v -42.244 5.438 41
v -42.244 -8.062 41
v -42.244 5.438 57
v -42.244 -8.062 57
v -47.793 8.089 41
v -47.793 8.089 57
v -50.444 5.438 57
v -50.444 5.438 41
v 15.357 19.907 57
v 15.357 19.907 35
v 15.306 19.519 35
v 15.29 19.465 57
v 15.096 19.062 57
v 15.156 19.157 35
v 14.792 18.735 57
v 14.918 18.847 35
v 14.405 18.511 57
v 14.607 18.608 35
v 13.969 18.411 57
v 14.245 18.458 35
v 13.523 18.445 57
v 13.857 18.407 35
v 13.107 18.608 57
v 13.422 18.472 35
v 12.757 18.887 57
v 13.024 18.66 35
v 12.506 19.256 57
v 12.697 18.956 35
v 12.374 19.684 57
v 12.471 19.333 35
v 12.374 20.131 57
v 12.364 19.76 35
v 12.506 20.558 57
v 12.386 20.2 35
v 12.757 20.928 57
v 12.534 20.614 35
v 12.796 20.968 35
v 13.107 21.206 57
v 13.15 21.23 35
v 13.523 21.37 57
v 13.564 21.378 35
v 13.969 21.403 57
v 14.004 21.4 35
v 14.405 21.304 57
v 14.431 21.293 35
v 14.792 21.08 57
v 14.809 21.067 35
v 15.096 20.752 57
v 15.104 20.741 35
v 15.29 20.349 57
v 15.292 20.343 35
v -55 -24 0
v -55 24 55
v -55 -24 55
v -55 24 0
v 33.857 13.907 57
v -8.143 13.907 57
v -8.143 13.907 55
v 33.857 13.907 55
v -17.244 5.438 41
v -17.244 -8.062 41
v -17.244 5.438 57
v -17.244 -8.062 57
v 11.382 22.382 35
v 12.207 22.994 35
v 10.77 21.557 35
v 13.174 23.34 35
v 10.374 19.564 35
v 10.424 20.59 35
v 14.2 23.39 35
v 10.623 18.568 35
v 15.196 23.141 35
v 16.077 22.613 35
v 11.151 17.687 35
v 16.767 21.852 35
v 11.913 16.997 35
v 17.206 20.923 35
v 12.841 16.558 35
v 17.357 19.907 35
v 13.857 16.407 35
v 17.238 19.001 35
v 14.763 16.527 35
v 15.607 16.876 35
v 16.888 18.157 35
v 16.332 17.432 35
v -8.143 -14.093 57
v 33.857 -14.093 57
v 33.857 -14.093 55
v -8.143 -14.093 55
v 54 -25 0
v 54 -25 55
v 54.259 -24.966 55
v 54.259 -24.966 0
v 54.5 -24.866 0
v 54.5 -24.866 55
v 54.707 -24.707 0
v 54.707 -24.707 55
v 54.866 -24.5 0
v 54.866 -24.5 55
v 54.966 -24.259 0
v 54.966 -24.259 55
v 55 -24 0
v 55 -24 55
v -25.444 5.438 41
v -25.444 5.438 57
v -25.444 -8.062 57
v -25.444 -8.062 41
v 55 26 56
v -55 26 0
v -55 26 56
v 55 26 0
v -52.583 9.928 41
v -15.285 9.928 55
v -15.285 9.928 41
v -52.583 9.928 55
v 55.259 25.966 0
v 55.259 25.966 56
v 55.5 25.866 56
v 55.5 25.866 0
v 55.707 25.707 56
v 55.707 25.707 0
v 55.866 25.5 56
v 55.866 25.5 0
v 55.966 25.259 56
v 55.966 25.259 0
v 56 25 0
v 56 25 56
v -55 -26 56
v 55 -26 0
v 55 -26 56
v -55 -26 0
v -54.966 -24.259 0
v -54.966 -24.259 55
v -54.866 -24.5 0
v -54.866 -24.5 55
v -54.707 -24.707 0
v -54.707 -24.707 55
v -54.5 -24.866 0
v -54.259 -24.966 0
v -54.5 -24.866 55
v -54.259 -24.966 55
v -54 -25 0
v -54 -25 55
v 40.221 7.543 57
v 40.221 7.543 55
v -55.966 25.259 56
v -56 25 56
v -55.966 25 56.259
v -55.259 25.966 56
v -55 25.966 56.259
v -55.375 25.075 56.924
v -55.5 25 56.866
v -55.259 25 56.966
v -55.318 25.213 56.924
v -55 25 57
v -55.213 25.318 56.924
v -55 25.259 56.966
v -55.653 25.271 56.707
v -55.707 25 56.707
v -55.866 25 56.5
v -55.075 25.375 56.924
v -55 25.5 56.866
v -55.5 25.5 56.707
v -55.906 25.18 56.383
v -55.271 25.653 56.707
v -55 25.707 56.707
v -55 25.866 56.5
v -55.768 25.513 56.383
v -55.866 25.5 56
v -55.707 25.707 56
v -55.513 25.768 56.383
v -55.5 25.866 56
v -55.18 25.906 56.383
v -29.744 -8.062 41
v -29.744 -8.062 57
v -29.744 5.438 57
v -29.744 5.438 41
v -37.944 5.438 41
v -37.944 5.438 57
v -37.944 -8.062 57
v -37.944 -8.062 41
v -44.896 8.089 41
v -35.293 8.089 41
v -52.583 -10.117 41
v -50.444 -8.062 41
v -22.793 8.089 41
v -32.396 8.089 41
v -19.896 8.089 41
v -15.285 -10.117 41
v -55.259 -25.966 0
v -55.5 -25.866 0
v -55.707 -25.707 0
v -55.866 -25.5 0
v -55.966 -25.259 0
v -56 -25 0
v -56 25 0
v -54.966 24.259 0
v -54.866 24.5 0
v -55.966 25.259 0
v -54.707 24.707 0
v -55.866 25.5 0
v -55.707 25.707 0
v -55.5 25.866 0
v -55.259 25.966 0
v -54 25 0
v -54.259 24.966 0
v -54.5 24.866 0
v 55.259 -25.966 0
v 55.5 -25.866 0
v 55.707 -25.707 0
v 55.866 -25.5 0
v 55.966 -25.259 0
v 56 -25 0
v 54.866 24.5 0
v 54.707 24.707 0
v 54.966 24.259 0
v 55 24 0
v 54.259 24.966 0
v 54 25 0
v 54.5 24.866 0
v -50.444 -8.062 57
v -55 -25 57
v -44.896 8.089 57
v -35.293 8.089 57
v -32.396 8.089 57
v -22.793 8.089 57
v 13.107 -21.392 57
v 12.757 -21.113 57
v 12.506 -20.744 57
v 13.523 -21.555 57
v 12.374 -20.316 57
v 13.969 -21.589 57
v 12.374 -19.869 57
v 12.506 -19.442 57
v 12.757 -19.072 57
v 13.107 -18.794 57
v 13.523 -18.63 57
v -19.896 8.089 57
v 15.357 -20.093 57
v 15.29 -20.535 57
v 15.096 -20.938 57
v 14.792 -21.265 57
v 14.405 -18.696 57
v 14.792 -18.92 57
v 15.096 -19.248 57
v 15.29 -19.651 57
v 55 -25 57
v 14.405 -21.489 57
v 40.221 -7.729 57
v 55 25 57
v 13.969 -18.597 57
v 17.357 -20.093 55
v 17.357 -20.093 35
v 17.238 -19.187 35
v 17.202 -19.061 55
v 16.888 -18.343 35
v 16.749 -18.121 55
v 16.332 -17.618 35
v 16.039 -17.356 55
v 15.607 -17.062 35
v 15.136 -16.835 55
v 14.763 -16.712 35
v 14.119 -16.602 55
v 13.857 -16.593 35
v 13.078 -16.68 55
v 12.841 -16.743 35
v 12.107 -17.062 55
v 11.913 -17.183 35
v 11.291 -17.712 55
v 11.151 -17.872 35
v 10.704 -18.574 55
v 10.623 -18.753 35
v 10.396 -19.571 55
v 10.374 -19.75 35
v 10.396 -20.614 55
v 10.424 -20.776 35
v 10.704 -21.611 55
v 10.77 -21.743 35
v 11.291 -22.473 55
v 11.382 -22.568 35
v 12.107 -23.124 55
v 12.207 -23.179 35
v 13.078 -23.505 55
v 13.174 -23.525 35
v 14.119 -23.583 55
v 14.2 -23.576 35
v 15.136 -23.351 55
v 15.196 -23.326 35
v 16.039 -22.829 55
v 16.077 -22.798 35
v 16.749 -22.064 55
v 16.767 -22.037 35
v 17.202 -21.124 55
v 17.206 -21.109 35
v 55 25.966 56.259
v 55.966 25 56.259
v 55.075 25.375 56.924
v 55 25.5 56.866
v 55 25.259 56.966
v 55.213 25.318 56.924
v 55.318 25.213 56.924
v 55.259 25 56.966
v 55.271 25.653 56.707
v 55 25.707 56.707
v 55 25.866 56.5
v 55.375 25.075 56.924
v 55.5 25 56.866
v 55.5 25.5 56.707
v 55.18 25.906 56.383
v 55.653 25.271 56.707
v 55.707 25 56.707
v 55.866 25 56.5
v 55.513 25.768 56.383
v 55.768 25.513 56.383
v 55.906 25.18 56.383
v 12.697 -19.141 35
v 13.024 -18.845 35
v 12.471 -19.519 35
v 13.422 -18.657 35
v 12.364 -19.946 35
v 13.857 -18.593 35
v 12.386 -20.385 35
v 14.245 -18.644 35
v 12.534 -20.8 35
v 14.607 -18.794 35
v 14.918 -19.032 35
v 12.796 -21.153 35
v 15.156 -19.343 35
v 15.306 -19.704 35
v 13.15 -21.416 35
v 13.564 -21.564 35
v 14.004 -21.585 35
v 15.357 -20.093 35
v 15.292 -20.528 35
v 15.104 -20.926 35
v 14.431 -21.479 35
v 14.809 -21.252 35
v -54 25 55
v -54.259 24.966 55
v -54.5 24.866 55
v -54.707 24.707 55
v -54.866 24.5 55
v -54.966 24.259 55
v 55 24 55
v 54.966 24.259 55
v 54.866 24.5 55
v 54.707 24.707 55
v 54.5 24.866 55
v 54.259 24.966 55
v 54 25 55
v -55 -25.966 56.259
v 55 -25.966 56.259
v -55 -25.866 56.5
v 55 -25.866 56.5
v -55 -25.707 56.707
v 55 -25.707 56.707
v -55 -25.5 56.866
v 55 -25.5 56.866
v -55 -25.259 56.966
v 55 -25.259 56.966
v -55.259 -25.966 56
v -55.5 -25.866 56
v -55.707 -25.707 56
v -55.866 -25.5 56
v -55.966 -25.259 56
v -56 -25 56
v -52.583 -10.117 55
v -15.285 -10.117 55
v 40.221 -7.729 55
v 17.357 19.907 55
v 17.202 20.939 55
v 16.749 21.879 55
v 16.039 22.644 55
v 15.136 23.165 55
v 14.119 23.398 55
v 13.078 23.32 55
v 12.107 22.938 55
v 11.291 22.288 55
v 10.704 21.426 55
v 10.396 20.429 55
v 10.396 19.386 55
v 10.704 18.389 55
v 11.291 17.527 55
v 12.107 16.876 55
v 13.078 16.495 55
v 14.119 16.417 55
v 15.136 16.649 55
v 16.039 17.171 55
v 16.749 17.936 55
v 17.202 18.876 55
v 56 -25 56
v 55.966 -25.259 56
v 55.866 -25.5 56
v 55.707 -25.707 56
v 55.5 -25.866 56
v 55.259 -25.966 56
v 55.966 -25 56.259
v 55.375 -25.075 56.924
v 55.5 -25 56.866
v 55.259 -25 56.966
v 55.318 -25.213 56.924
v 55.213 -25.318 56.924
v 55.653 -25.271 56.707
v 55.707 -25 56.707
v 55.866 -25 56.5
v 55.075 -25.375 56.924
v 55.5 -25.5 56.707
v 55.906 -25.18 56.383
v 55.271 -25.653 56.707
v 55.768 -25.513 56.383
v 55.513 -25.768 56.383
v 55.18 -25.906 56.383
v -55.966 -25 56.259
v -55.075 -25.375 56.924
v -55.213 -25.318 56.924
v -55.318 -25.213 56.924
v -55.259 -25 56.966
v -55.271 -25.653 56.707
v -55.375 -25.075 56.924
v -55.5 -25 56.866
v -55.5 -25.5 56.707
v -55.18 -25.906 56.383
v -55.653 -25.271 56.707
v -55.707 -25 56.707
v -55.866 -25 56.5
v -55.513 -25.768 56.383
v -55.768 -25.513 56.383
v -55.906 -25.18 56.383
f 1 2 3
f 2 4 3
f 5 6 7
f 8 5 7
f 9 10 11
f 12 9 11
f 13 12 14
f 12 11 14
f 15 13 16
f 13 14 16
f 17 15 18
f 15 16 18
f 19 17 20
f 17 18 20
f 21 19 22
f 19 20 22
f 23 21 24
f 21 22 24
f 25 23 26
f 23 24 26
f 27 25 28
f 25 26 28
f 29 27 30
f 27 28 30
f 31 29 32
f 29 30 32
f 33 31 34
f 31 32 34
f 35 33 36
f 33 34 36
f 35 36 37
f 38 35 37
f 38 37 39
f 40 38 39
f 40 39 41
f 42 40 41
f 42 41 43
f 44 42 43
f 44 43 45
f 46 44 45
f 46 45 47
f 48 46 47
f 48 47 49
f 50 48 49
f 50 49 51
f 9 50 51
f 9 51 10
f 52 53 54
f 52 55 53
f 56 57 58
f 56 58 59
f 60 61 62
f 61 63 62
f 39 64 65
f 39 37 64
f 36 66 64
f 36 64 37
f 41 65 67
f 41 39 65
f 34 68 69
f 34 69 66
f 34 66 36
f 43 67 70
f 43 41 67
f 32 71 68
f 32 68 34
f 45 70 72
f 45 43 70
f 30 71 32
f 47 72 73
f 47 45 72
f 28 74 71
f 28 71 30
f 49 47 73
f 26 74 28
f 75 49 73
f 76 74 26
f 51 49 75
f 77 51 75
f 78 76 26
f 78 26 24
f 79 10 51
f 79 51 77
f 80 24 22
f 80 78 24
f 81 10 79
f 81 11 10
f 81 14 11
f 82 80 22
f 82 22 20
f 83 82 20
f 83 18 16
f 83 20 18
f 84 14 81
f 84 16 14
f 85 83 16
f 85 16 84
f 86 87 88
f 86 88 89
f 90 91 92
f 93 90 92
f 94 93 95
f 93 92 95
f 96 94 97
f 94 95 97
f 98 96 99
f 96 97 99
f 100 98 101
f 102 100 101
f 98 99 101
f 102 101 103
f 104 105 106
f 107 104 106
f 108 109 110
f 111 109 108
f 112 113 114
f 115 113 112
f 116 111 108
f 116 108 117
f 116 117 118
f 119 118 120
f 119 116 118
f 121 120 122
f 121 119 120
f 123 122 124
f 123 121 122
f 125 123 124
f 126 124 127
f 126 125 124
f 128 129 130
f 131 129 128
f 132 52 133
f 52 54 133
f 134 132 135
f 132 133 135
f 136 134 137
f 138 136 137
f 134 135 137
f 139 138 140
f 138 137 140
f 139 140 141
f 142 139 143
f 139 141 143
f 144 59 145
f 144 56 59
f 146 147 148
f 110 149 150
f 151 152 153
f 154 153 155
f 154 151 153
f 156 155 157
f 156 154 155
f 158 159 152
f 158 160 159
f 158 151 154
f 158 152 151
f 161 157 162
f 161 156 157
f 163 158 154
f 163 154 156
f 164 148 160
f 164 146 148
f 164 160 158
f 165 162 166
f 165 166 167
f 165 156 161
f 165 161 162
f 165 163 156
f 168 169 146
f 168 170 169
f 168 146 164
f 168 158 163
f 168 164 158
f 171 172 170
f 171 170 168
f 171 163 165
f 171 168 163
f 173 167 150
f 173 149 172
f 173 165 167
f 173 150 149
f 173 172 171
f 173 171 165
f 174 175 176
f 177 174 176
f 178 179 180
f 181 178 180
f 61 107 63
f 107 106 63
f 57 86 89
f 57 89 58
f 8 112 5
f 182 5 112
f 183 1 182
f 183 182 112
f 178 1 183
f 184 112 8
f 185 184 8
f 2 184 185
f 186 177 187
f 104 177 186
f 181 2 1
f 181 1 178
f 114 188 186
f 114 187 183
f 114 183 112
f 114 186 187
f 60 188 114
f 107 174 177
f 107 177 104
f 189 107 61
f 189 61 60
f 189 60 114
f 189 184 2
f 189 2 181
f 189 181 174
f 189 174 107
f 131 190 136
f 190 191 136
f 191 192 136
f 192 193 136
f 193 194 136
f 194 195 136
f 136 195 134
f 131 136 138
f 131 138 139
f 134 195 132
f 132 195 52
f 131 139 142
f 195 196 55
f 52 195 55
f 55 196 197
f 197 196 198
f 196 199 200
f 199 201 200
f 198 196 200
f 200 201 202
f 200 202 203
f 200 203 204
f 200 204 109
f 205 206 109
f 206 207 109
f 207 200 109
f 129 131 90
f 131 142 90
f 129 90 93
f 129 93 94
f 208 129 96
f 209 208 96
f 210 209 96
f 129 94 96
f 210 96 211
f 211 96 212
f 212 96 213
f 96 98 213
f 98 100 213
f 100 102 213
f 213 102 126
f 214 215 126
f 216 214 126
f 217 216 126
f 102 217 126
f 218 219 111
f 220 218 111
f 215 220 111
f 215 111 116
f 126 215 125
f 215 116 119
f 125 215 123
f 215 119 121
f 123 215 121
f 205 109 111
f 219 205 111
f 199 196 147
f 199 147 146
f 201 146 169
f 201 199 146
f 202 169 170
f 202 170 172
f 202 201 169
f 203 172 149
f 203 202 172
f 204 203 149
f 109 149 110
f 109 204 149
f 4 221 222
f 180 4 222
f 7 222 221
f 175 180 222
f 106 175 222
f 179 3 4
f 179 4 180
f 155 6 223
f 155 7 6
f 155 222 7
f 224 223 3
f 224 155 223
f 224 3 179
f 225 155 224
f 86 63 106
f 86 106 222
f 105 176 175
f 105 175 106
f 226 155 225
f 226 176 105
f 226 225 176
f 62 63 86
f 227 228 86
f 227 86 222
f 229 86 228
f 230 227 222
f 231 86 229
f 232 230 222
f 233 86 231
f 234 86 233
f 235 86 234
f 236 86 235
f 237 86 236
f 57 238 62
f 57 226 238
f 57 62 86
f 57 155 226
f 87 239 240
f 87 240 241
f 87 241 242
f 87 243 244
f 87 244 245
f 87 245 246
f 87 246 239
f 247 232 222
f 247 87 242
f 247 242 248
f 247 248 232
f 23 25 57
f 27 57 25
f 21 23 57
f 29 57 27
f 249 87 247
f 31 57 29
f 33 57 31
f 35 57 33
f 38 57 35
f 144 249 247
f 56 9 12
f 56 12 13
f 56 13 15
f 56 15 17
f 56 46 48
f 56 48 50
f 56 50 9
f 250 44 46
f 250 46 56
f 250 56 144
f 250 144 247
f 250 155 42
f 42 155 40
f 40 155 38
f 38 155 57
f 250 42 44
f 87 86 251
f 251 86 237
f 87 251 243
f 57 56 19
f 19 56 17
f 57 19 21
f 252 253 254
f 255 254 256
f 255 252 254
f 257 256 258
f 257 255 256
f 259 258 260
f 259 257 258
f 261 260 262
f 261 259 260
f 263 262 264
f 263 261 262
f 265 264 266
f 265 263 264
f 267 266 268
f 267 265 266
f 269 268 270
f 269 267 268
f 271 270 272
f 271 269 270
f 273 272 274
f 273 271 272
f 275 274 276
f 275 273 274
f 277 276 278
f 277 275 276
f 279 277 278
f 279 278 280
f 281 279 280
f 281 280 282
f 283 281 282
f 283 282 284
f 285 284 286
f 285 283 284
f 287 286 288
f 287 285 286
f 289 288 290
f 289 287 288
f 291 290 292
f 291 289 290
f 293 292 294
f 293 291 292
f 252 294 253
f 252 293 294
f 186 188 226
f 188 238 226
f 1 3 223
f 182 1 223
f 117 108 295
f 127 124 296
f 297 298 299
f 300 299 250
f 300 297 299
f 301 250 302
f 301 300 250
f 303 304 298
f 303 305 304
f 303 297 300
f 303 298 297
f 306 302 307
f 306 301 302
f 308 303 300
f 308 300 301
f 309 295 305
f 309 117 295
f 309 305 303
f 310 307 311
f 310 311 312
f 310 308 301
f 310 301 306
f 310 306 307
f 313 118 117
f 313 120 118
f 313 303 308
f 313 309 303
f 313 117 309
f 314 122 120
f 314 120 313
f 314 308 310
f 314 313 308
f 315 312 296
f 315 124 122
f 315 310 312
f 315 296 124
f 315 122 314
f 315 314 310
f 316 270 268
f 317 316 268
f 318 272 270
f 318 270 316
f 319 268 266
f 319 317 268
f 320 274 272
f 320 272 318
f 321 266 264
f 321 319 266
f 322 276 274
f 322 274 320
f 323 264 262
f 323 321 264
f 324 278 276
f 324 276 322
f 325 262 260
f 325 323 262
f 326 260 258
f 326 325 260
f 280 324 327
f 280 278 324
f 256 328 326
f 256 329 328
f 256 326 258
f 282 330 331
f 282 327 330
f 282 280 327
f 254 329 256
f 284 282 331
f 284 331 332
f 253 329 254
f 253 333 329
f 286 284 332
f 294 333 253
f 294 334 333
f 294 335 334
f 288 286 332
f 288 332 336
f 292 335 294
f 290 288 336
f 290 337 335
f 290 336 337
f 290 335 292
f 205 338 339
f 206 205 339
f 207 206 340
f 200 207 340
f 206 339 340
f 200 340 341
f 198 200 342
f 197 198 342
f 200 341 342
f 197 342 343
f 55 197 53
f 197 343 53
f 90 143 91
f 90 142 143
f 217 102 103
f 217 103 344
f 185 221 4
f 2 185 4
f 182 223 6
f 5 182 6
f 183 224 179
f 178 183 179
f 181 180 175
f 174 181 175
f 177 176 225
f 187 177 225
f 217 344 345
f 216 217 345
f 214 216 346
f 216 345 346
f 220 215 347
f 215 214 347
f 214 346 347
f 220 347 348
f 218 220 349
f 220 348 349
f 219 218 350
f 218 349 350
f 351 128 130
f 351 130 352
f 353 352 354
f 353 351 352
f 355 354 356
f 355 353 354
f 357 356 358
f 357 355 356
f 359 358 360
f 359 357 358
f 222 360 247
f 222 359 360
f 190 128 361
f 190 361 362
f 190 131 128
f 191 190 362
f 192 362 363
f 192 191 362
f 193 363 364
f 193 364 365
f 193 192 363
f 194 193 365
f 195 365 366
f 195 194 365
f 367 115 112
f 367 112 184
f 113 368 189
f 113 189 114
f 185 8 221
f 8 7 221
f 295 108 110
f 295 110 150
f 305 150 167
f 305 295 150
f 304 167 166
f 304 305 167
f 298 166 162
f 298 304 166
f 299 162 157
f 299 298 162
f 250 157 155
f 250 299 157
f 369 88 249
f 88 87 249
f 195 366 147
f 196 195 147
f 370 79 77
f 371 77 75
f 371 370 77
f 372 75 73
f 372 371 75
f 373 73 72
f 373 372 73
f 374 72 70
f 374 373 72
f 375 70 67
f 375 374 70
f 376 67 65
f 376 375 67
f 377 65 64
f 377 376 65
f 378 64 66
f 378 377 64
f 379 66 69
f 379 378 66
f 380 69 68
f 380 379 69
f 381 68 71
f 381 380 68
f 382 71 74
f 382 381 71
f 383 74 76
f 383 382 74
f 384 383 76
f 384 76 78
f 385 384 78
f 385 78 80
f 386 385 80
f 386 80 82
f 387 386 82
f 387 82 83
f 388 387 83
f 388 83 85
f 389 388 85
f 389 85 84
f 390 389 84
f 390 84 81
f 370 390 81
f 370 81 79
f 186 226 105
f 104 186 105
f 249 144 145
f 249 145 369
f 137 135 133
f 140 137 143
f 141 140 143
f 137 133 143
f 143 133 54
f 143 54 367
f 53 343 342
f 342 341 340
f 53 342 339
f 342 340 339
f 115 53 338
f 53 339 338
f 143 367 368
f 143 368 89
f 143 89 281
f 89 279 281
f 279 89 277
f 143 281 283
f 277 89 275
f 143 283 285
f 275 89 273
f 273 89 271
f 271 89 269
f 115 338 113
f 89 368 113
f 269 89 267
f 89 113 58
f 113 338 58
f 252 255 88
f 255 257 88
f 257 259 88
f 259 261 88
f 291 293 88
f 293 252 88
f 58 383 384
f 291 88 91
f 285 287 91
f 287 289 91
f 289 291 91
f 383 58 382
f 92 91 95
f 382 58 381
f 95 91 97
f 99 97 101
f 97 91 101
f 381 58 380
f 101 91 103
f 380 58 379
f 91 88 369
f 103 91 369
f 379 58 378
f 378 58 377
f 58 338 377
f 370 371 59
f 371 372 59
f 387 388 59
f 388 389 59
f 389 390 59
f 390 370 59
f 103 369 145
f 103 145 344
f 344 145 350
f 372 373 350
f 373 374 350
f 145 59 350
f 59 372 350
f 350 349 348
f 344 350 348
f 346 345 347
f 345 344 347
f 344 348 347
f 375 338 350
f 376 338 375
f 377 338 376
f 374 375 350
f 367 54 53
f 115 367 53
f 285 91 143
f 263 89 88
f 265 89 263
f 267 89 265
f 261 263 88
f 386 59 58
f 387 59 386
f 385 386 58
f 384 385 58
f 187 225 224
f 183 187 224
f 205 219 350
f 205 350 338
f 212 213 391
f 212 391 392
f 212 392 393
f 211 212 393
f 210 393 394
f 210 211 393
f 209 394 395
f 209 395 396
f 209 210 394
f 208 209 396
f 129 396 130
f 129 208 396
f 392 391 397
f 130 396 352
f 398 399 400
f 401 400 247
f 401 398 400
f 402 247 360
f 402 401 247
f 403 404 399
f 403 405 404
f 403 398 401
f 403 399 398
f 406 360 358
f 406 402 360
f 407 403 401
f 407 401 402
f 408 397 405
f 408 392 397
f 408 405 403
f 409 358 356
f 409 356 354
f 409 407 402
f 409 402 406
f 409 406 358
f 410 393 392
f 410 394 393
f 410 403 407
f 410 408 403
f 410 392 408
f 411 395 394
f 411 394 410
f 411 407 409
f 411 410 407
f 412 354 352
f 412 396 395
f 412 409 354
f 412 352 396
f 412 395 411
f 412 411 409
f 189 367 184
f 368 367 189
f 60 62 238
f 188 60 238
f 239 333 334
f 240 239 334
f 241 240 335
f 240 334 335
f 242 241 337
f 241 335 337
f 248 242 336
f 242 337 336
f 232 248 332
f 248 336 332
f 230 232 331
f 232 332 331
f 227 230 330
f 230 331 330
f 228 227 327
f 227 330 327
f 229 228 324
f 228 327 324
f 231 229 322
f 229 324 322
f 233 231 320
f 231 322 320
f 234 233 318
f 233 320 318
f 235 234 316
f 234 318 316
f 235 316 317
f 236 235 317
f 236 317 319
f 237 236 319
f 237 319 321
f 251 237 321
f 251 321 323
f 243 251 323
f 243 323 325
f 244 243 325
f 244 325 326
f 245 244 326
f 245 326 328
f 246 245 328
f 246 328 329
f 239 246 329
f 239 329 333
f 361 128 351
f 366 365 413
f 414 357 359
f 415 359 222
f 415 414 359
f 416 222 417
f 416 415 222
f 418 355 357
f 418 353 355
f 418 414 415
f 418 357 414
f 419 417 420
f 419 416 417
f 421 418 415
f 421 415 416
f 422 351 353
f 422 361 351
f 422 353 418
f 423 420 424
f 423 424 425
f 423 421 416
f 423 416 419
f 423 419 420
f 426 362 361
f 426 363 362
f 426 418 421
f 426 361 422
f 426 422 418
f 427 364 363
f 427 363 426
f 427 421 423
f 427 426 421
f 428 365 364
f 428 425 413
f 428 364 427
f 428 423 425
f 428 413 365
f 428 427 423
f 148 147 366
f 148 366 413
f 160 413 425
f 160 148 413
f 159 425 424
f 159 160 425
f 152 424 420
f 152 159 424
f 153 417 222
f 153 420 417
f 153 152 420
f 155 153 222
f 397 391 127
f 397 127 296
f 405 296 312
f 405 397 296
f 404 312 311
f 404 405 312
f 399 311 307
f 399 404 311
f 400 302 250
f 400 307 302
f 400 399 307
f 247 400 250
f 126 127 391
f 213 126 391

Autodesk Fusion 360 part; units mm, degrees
sketch "Box" plane through (0, 0, 0) normal (0, 0, 1) x (1, 0, 0)
  line L0 (55, 25) -> (-55, 25)
  line L1 (-55, 25) -> (-55, -25)
  line L2 (-55, -25) -> (55, -25)
  line L3 (55, -25) -> (55, 25)
  line L4 (55, 25) -> (-55, -25) construction
  line L5 (-55, 25) -> (55, -25) construction
  line L6 (56, -26) -> (-56, -26)
  line L7 (-56, -26) -> (-56, 26)
  line L8 (-56, 26) -> (56, 26)
  line L9 (56, 26) -> (56, -26)
  line L10 (56, -26) -> (-56, 26) construction
  line L11 (-56, -26) -> (56, 26) construction
  dimension "d2" = 110
  dimension "d3" = 50
  dimension "d4" = 112
  dimension "d5" = 52
extrude "Extrude1" add sketch "Box" along normal blind 55
fillet "Fillet1" radius 1 4 edges at (56, -26, 27.5) (-56, -26, 27.5) (56, 26, 27.5) (-56, 26, 27.5)
fillet "Fillet2" radius 1 4 edges at (55, -25, 27.5) (55, 25, 27.5) (-55, 25, 27.5) (-55, -25, 27.5)
ref_plane "WorkPlane1" through (0, 0, 55) normal (0, 0, 1) x (1, 0, 0)
sketch "Lid" plane through (0, 0, 55) normal (0, 0, 1) x (1, 0, 0)
  line L0 (55, -26) -> (-55, -26)
  line L1 (-56, -25) -> (-56, 25)
  line L2 (-55, 26) -> (55, 26)
  line L3 (56, 25) -> (56, -25)
  line L4 (56, -26) -> (-56, 26) construction
  line L5 (-56, -26) -> (56, 26) construction
  arc A0 (-55, 26) -> (-56, 25) centre (-55, 25) ccw
  arc A1 (56, 25) -> (55, 26) centre (55, 25) ccw
  arc A2 (55, -26) -> (56, -25) centre (55, -25) ccw
  arc A3 (-56, -25) -> (-55, -26) centre (-55, -25) ccw
  dimension "d13" = 112
  dimension "d14" = 52
  dimension "d15" = 1
  dimension "d16" = 1
  dimension "d17" = 1
  dimension "d18" = 1
extrude "Extrude2" add sketch "Lid" along normal blind 2
fillet "Fillet3" radius 1 8 edges at (0, 26, 57) (-55.7071, 25.7071, 57) (-56, 0, 57) (-55.7071, -25.7071, 57) (0, -26, 57) (55.7071, -25.7071, 57) (56, 0, 57) (55.7071, 25.7071, 57)
sketch "230 plug" plane through (0, 0, 57) normal (0, 0, 1) x (-1, 0, 0)
  line L0 (-55, -25) -> (55, -25)
  line L1 (55, -25) -> (55, 25)
  line L2 (55, 25) -> (-55, 25)
  line L3 (-55, 25) -> (-55, -25)
  line L4 (8.143, -13.9073) -> (-33.857, -13.9073)
  line L5 (-33.857, 14.0927) -> (8.143, 14.0927)
  line L6 (8.143, 14.0927) -> (8.143, -13.9073)
  line L7 (8.143, -13.9073) -> (-33.857, 14.0927) construction
  line L8 (-33.857, -13.9073) -> (8.143, 14.0927) construction
  line L9 (-33.857, 14.0927) -> (-40.2209, 7.7287)
  line L10 (-33.857, 14.0927) -> (-12.0333, 14.0927) construction
  line L11 (-33.857, -13.9073) -> (-40.2209, -7.5434)
  line L12 (-33.857, -13.9073) -> (-12.0333, -13.9073) construction
  line L13 (-40.2209, -7.5434) -> (-40.2209, 7.7287)
  point P0 (-12.857, 0.0927)
  dimension "d32" = 28
  dimension "d33" = 42
  dimension "d34" = 135
  dimension "d35" = 9
  dimension "d36" = 135
  dimension "d37" = 9
extrude "Extrude3" cut sketch "230 plug" against normal blind 2 contours L4 L5 L6 L9 L11 L13
ref_plane "WorkPlane2" through (0, 0, 55) normal (0, 0, -1) x (-1, 0, 0)
sketch "Screw Holes" plane through (0, 0, 55) normal (0, 0, -1) x (1, 0, 0)
  line L0 (-8.143, 14.0927) -> (-8.143, -13.9073)
  circle A0 centre (13.857, -19.9073) radius 1.5
  line L1 (-8.143, -13.9073) -> (13.857, -13.9073)
  line L2 (13.857, -13.9073) -> (13.857, -19.9073)
  circle A1 centre (13.857, -19.9073) radius 3.5
  line L3 (-8.143, 14.0927) -> (13.857, 14.0927)
  line L4 (13.857, 14.0927) -> (13.857, 20.0927)
  circle A2 centre (13.857, 20.0927) radius 3.5
  circle A3 centre (13.857, 20.0927) radius 1.5
  dimension "d44" = 3
  dimension "d45" = 22
  dimension "d46" = 6
  dimension "d47" = 7
  dimension "d49" = 22
  dimension "d50" = 6
  dimension "d51" = 7
  dimension "d52" = 3
extrude "Extrude5" add sketch "Screw Holes" along normal blind 20
extrude "Extrude6" cut sketch "Screw Holes" against normal blind 2 contours A0 | A3
sketch "XT60 plug 1" plane through (0, 0, 55) normal (0, 0, -1) x (1, 0, 0)
  circle A0 centre (13.857, -19.9073) radius 3.5
  line L0 (40.2209, 7.7287) -> (40.2209, -7.5434)
  line L1 (40.2209, -7.5434) -> (33.857, -13.9073)
  line L2 (33.857, -13.9073) -> (-8.143, -13.9073)
  line L3 (-8.143, -13.9073) -> (-8.143, 14.0927)
  line L4 (-8.143, 14.0927) -> (33.857, 14.0927)
  line L5 (33.857, 14.0927) -> (40.2209, 7.7287)
  arc A1 (-54, 25) -> (-55, 24) centre (-54, 24) ccw
  line L6 (-55, 24) -> (-55, -24)
  arc A2 (-55, -24) -> (-54, -25) centre (-54, -24) ccw
  line L7 (-54, -25) -> (54, -25)
  arc A3 (54, -25) -> (55, -24) centre (54, -24) ccw
  line L8 (55, -24) -> (55, 24)
  arc A4 (55, 24) -> (54, 25) centre (54, 24) ccw
  line L9 (54, 25) -> (-54, 25)
  circle A5 centre (13.857, 20.0927) radius 3.5
  line L10 (-50.4445, 8.0625) -> (-42.2445, 8.0625)
  line L11 (-42.2445, -5.4375) -> (-44.8962, -8.0891)
  line L12 (-50.4445, -5.4375) -> (-47.7929, -8.0891)
  line L13 (-47.7929, -8.0891) -> (-44.8962, -8.0891)
  line L14 (-37.9445, 8.0625) -> (-29.7445, 8.0625)
  line L15 (-29.7445, 8.0625) -> (-29.7445, -5.4375)
  line L16 (-29.7445, -5.4375) -> (-32.3962, -8.0891)
  line L17 (-37.9445, -5.4375) -> (-35.2929, -8.0891)
  line L18 (-35.2929, -8.0891) -> (-32.3962, -8.0891)
  line L19 (-17.2445, 8.0625) -> (-25.4445, 8.0625)
  line L20 (-25.4445, 8.0625) -> (-25.4445, -5.4375)
  line L21 (-25.4445, -5.4375) -> (-22.7929, -8.0891)
  line L22 (-17.2445, -5.4375) -> (-19.8962, -8.0891)
  line L23 (-22.7929, -8.0891) -> (-19.8962, -8.0891)
  line L24 (-42.2445, -5.4375) -> (-42.2445, 8.0625)
  line L25 (-37.9445, -5.4375) -> (-37.9445, 8.0625)
  line L26 (-17.2445, -5.4375) -> (-17.2445, 8.0625)
  line L27 (-50.4445, 8.0625) -> (-50.4445, -5.4375)
  line L28 (-42.2445, 1.3125) -> (-37.9445, 1.3125)
  line L29 (-29.7445, 1.3125) -> (-25.4445, 1.3125)
  dimension "d70" = 3.75
  dimension "d71" = 3.75
  dimension "d72" = 8.2
  dimension "d75" = 3.75
  dimension "d76" = 3.75
  dimension "d79" = 8.2
  dimension "d80" = 13.5
  dimension "d81" = 3.75
  dimension "d83" = 3.75
  dimension "d89" = 8.2
  dimension "d91" = 4.3
extrude "Extrude7" cut sketch "XT60 plug 1" against normal blind 2 contours L19 L20 L21 L22 L23 L26 | L14 L15 L16 L17 L18 L25 | L10 L11 L12 L13 L24 L27
sketch "Sketch7" plane through (0, 0, 55) normal (0, 0, -1) x (1, 0, 0)
  line L0 (-47.7929, -8.0891) -> (-50.4445, -5.4375)
  line L1 (-50.4445, 8.0625) -> (-42.2445, 8.0625)
  line L2 (-42.2445, 8.0625) -> (-42.2445, -5.4375)
  line L3 (-42.2445, -5.4375) -> (-44.8962, -8.0891)
  line L4 (-44.8962, -8.0891) -> (-47.7929, -8.0891)
  line L5 (-29.7445, -5.4375) -> (-32.3962, -8.0891)
  line L6 (-32.3962, -8.0891) -> (-35.2929, -8.0891)
  line L7 (-35.2929, -8.0891) -> (-37.9445, -5.4375)
  line L8 (-37.9445, -5.4375) -> (-37.9445, 8.0625)
  line L9 (-37.9445, 8.0625) -> (-29.7445, 8.0625)
  line L10 (-29.7445, 8.0625) -> (-29.7445, -5.4375)
  line L11 (-25.4445, 8.0625) -> (-17.2445, 8.0625)
  line L12 (-17.2445, 8.0625) -> (-17.2445, -5.4375)
  line L13 (-17.2445, -5.4375) -> (-19.8962, -8.0891)
  line L14 (-19.8962, -8.0891) -> (-22.7929, -8.0891)
  line L15 (-22.7929, -8.0891) -> (-25.4445, -5.4375)
  line L16 (-25.4445, -5.4375) -> (-25.4445, 8.0625)
  circle A0 centre (13.857, -19.9073) radius 3.5
  line L17 (40.2209, 7.7287) -> (40.2209, -7.5434)
  line L18 (40.2209, -7.5434) -> (33.857, -13.9073)
  line L19 (33.857, -13.9073) -> (-8.143, -13.9073)
  line L20 (-8.143, -13.9073) -> (-8.143, 14.0927)
  line L21 (-8.143, 14.0927) -> (33.857, 14.0927)
  line L22 (33.857, 14.0927) -> (40.2209, 7.7287)
  arc A1 (-54, 25) -> (-55, 24) centre (-54, 24) ccw
  line L23 (-55, 24) -> (-55, -24)
  arc A2 (-55, -24) -> (-54, -25) centre (-54, -24) ccw
  line L24 (-54, -25) -> (54, -25)
  arc A3 (54, -25) -> (55, -24) centre (54, -24) ccw
  line L25 (55, -24) -> (55, 24)
  arc A4 (55, 24) -> (54, 25) centre (54, 24) ccw
  line L26 (54, 25) -> (-54, 25)
  circle A5 centre (13.857, 20.0927) radius 3.5
  line L27 (-15.2847, -9.9279) -> (-52.5832, -9.9279)
  line L28 (-52.5832, -9.9279) -> (-52.5832, 10.117)
  line L29 (-52.5832, 10.117) -> (-15.2847, 10.117)
  line L30 (-15.2847, 10.117) -> (-15.2847, -9.9279)
  line L31 (-15.2847, -9.9279) -> (-52.5832, 10.117) construction
  line L32 (-52.5832, -9.9279) -> (-15.2847, 10.117) construction
  line L33 (-50.4445, -5.4375) -> (-50.4445, 8.0625)
  point P0 (-33.934, 0.0945)
extrude "Extrude8" add sketch "Sketch7" along normal blind 14 contours L27 L28 L29 L30
extrude "Extrude4" [suppressed]
